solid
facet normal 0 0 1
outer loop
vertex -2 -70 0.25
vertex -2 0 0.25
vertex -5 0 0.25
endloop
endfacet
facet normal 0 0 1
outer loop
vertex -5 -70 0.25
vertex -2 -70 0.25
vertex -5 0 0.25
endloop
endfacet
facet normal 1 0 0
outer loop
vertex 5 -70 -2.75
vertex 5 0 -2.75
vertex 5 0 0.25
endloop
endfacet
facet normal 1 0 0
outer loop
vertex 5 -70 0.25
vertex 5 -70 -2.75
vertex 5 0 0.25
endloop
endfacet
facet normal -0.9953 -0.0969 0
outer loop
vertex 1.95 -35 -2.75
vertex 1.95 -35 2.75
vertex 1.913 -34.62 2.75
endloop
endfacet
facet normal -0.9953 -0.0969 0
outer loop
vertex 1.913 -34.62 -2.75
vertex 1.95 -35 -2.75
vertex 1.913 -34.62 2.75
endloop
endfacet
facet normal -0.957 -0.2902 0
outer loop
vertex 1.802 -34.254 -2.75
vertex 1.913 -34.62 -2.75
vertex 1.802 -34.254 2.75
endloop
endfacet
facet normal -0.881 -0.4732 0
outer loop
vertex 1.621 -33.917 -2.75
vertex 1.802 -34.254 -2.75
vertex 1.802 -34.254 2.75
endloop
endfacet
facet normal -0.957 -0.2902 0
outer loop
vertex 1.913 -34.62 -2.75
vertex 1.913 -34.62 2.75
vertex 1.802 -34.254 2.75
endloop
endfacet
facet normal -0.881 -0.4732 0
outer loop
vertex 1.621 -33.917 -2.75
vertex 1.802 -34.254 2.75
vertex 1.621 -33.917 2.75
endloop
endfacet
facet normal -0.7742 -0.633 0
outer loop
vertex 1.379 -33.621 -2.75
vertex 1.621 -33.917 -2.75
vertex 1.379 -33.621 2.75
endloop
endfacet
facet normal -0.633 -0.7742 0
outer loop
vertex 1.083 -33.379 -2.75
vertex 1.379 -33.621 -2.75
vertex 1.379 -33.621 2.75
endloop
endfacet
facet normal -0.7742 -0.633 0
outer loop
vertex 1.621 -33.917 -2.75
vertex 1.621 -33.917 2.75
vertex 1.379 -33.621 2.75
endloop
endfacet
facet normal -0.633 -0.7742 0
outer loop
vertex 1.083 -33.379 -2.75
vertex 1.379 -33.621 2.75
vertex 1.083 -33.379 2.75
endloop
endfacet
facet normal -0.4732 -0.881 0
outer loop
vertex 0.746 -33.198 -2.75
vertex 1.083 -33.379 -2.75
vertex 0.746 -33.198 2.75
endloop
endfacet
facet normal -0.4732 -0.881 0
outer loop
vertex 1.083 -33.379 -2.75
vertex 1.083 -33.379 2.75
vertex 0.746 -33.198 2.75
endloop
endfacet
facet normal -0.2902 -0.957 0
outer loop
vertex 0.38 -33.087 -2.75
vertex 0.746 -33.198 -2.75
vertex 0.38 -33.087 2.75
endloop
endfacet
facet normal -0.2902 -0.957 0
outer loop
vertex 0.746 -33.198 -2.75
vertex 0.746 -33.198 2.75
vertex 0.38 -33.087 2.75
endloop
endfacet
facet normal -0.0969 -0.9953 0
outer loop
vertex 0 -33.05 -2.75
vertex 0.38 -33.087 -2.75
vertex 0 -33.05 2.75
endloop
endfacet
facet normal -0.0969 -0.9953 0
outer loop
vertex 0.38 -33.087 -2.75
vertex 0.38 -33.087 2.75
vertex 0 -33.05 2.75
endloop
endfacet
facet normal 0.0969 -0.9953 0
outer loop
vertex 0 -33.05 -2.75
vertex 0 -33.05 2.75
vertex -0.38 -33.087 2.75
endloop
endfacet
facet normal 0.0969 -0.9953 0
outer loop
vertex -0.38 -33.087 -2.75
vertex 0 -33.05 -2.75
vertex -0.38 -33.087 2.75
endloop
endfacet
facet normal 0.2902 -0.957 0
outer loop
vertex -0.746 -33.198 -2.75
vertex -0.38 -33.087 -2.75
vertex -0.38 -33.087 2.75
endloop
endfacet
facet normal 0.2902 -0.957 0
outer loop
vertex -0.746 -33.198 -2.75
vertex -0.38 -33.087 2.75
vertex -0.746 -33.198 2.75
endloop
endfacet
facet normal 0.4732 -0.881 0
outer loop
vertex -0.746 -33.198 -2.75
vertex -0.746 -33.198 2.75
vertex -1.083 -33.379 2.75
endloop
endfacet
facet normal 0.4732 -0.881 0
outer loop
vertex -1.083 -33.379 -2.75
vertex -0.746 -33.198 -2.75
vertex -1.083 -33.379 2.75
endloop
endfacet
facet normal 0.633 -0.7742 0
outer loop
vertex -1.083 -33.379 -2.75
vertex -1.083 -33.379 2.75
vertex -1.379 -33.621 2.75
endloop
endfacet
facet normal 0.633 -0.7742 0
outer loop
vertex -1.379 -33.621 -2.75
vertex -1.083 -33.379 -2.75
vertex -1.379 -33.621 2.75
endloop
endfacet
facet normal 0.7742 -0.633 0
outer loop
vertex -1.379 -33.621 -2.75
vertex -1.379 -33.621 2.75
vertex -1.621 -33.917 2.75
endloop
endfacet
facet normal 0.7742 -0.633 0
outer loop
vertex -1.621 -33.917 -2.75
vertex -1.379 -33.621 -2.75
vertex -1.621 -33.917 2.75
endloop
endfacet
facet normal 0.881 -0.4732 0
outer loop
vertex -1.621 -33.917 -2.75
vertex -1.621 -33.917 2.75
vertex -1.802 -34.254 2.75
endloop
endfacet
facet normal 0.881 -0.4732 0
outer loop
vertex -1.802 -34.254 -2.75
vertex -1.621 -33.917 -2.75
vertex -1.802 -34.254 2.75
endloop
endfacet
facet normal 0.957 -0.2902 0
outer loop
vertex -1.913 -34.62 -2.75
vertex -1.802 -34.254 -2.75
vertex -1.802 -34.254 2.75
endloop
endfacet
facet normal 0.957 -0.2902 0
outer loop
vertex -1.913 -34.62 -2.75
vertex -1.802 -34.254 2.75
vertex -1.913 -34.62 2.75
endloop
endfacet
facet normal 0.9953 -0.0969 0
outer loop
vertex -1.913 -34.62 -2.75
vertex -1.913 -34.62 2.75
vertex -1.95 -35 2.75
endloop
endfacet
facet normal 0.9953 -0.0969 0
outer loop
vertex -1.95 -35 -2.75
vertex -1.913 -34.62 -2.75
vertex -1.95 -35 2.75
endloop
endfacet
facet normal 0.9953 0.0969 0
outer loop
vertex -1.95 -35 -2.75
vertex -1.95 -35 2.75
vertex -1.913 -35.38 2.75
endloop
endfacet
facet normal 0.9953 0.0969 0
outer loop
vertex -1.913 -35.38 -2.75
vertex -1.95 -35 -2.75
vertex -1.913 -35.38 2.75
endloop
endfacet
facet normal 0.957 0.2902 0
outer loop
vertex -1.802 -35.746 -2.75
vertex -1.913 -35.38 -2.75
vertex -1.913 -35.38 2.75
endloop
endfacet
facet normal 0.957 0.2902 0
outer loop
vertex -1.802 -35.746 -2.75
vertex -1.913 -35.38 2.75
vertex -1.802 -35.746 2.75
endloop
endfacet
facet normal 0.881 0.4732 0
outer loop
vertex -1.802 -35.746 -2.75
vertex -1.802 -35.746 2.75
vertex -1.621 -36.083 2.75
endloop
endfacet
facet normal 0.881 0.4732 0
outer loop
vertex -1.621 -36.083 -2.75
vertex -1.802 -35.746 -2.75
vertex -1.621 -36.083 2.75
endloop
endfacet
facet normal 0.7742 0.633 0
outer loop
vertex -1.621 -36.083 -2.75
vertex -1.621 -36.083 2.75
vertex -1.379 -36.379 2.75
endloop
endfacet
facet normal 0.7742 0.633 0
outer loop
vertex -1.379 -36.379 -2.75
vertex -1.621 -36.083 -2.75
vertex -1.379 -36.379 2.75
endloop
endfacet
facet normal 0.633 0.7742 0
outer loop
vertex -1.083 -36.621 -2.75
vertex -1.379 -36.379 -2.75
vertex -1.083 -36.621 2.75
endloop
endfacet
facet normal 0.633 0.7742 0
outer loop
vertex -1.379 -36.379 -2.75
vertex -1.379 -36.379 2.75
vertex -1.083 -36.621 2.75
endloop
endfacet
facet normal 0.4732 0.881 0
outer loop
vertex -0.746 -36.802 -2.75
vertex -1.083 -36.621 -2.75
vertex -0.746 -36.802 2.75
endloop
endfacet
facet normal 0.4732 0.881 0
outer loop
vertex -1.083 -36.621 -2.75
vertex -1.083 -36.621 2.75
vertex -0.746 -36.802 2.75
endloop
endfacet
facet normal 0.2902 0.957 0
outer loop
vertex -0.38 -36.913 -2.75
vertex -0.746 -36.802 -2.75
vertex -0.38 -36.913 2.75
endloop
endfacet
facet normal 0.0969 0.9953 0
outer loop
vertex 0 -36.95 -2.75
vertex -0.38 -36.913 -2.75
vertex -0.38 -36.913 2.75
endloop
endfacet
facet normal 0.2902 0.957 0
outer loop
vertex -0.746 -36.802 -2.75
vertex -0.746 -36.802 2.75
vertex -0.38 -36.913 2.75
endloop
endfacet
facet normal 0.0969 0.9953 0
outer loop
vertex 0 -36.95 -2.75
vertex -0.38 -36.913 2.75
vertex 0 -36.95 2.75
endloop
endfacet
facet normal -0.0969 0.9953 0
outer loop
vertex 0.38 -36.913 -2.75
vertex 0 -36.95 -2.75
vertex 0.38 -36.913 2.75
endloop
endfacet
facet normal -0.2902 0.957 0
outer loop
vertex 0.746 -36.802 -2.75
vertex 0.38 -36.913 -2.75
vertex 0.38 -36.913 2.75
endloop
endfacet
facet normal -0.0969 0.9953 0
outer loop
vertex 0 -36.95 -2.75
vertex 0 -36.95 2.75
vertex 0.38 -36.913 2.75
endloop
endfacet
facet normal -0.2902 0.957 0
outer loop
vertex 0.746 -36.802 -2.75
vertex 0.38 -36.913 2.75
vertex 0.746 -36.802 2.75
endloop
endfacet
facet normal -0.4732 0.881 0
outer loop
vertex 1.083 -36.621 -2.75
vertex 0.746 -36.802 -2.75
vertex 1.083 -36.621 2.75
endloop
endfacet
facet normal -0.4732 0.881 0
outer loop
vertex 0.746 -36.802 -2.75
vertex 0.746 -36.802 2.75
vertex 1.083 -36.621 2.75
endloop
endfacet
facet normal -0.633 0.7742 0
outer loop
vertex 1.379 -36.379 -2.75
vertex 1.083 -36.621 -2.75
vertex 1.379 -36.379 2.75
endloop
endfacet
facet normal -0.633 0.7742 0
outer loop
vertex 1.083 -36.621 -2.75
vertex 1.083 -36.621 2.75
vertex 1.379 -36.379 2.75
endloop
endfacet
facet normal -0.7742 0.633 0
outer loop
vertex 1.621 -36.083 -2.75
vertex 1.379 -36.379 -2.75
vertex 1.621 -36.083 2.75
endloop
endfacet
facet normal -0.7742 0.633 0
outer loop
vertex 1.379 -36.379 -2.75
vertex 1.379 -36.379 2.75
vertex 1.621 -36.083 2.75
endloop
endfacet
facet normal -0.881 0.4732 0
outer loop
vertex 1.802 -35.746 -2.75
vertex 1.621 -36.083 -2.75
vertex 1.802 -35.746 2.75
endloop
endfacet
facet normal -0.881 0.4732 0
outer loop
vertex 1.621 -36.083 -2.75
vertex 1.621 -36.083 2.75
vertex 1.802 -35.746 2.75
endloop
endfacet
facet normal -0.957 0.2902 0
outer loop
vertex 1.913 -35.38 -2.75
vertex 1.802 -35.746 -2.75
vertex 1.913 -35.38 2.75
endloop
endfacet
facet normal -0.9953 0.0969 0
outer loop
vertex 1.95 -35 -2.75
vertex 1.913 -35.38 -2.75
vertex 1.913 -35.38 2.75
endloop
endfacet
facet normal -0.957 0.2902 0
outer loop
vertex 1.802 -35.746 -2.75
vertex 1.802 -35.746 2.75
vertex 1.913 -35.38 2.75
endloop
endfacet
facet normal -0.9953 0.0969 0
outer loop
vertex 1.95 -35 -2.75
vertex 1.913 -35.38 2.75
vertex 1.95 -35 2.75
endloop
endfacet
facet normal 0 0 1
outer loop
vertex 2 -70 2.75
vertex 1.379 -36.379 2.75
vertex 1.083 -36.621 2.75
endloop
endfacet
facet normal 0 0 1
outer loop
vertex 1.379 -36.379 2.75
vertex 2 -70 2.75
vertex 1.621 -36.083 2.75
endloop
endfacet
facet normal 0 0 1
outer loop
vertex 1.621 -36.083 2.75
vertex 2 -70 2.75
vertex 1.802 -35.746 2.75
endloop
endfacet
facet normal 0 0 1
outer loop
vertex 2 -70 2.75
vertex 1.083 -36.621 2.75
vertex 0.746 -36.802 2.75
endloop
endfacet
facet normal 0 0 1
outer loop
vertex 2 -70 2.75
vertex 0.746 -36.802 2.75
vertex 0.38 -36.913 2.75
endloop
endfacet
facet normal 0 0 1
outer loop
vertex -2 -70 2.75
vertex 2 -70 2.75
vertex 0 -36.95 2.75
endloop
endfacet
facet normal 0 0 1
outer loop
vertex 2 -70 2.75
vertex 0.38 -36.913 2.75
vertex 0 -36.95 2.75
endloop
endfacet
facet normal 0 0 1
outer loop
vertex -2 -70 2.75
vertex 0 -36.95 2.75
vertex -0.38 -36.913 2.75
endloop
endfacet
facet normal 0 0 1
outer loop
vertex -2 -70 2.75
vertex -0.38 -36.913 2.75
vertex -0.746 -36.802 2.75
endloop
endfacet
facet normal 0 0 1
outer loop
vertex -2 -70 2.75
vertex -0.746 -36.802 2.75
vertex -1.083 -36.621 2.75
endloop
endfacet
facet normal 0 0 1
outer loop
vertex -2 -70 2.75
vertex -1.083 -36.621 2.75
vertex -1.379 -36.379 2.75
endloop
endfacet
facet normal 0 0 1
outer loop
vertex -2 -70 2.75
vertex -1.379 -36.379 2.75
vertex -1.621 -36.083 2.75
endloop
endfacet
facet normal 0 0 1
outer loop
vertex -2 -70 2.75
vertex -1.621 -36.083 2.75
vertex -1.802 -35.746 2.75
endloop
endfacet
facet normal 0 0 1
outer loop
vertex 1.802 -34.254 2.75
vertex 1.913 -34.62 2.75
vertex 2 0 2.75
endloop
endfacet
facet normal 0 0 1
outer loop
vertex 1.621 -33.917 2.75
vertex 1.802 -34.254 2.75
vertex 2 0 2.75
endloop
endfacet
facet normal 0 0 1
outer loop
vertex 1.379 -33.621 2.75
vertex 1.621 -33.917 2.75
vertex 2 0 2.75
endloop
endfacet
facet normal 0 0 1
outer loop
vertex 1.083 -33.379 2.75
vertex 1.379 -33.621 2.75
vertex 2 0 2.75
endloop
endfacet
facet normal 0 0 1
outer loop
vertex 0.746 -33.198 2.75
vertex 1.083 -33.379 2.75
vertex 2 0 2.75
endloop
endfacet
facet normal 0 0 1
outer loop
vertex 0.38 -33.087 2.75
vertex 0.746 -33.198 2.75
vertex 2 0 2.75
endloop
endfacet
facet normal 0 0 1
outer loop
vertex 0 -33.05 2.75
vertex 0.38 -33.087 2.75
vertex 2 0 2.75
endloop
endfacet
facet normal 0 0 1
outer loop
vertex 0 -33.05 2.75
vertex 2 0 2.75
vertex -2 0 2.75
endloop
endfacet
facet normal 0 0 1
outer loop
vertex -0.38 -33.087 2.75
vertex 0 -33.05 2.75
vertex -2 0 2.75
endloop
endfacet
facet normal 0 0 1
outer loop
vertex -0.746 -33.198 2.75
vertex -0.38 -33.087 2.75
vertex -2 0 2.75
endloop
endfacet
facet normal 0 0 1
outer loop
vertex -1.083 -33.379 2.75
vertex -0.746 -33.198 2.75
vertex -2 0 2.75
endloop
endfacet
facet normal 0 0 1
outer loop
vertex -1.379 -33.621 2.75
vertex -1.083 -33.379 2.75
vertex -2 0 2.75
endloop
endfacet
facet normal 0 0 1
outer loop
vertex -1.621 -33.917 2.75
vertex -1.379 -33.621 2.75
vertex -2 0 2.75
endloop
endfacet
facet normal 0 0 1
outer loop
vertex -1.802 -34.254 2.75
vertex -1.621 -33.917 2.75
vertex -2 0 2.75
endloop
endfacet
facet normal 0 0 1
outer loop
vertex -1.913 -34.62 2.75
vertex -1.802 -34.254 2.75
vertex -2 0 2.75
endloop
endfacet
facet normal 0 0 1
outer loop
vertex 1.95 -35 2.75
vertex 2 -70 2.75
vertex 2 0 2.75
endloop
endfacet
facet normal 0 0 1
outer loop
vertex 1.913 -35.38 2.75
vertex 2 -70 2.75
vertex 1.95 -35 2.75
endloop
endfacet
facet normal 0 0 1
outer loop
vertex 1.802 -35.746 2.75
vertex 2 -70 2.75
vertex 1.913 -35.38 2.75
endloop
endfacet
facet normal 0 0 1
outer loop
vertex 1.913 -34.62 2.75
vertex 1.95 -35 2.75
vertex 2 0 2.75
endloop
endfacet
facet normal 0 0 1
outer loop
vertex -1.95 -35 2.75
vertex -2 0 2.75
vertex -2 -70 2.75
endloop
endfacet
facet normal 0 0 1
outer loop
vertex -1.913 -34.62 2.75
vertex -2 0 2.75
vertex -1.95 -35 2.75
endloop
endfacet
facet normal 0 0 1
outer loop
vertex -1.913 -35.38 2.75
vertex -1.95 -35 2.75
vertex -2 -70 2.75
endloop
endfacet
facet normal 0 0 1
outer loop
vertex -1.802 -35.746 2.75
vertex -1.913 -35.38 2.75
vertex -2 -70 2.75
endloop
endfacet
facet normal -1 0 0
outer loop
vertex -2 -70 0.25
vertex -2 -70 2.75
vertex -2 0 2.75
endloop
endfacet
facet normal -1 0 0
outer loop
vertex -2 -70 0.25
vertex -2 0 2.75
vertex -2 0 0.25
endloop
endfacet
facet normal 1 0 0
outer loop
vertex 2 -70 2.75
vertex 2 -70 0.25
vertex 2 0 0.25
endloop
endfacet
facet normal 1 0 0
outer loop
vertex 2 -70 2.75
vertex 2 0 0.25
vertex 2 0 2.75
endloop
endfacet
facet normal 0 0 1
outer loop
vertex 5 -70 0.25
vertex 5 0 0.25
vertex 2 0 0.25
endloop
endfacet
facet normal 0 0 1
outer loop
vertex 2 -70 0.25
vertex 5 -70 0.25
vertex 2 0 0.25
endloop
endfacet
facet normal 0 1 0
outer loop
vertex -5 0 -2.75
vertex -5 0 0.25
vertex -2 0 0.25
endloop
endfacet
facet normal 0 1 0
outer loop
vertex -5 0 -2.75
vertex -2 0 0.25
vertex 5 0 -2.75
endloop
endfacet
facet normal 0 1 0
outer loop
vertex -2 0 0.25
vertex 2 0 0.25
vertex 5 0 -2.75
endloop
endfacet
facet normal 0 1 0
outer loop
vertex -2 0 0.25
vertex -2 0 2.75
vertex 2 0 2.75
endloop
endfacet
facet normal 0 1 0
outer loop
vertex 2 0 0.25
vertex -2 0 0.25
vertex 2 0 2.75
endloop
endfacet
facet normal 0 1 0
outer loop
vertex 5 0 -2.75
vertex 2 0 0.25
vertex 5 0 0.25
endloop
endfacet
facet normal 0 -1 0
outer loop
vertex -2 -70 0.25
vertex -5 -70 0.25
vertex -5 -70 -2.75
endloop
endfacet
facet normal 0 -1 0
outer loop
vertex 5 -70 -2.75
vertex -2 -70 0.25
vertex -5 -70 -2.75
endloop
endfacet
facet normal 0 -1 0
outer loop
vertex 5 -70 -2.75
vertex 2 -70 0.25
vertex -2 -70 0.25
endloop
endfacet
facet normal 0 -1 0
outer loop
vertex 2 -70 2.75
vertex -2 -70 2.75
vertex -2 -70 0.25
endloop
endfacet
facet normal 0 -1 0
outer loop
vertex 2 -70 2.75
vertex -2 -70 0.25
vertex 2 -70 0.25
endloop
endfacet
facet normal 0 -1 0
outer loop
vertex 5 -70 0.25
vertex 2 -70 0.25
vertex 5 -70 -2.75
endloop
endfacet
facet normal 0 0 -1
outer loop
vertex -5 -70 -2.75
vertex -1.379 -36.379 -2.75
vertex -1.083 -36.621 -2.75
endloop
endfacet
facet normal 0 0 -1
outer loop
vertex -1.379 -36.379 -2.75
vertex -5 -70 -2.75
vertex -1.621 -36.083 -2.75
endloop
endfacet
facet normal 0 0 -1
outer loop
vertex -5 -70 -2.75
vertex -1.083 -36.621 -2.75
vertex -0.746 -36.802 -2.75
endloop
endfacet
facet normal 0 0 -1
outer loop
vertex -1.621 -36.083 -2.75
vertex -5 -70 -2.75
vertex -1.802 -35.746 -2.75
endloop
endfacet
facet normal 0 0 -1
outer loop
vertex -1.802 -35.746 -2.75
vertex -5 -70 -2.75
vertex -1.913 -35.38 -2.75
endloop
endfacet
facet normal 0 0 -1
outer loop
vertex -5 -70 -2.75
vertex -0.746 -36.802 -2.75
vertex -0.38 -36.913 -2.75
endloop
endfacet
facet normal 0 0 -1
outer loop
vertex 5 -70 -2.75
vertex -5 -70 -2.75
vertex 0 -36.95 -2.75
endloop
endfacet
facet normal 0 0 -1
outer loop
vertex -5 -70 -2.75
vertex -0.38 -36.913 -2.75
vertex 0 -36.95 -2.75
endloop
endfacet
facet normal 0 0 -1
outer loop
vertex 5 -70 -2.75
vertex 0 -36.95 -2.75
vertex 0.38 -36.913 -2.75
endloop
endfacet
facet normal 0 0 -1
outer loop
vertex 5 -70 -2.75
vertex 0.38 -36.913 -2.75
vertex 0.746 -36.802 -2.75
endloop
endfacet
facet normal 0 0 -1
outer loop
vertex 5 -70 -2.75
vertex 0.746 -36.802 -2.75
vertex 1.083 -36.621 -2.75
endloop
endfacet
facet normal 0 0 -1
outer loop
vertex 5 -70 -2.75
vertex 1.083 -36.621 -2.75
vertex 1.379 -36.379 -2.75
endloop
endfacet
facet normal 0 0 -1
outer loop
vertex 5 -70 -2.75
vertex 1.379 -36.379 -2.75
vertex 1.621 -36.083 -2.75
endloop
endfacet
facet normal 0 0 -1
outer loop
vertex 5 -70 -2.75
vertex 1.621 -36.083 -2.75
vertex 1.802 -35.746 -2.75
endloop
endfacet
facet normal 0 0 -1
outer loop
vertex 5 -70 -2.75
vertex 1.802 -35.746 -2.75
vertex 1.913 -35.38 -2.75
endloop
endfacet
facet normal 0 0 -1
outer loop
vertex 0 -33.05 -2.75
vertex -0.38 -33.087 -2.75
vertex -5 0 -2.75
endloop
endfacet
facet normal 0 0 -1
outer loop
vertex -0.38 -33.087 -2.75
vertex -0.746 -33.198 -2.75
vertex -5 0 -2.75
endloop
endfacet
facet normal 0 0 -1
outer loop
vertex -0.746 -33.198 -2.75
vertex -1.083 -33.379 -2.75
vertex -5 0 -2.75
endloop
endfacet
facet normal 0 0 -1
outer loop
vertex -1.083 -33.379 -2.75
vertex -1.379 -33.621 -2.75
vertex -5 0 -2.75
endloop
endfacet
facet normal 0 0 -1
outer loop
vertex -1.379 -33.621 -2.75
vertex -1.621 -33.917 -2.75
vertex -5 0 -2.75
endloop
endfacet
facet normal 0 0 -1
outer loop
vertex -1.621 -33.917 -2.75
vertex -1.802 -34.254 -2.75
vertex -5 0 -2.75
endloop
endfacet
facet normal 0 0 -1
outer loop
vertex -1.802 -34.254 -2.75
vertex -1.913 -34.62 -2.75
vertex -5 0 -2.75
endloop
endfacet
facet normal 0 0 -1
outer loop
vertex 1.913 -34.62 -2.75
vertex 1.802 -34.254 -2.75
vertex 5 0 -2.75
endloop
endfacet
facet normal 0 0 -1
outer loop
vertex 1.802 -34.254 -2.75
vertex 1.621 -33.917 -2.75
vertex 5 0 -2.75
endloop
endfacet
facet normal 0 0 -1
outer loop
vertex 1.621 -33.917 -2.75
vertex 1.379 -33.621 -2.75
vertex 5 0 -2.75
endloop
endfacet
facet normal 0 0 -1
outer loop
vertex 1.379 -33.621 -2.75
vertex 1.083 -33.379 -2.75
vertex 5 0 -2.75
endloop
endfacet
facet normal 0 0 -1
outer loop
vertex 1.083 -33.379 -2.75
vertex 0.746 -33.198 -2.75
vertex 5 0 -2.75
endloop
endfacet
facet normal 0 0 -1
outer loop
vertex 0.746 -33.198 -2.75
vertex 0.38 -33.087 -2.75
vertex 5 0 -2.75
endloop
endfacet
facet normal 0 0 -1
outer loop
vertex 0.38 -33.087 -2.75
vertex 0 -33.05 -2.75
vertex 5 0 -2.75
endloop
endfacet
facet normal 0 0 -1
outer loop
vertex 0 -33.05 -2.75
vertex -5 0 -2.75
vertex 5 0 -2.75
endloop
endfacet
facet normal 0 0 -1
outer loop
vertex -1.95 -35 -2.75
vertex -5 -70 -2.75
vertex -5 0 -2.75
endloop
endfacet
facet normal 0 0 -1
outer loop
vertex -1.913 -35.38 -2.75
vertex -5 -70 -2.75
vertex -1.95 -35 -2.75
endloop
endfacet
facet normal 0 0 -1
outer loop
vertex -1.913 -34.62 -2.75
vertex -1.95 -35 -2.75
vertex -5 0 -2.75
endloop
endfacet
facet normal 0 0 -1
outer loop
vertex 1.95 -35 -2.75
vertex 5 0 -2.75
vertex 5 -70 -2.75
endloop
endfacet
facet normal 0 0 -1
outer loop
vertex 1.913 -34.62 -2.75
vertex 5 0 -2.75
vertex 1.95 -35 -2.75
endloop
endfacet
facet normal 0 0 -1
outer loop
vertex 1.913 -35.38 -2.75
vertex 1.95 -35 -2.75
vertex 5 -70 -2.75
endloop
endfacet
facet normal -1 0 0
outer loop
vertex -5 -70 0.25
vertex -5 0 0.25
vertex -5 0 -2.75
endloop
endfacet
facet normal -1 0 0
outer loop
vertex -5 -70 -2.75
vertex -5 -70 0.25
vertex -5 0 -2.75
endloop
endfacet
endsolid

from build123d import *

# Parameters (mm, degrees)
F1_DEPTH = 70
F2_R     = 1.95
F3_DEPTH = 25


with BuildPart() as f1:
    # F0 (on Front) → F1 (new body)
    with BuildSketch(Plane.XZ):
        Polygon((-5, 0.25), (-5, -2.75), (5, -2.75), (5, 0.25), (2.115, 0.25), (2, 0.25), (2, 2.75), (0, 2.75), (-2, 2.75), (-2, 0.25), align=None)
    extrude(amount=F1_DEPTH)

    # F2 (on face) → F3 (cut)
    with BuildSketch(Plane.XY.offset(2.75)):
        with Locations((0, -35)):
            Circle(F2_R)
    extrude(amount=-F3_DEPTH, mode=Mode.SUBTRACT)


solid = f1.part
